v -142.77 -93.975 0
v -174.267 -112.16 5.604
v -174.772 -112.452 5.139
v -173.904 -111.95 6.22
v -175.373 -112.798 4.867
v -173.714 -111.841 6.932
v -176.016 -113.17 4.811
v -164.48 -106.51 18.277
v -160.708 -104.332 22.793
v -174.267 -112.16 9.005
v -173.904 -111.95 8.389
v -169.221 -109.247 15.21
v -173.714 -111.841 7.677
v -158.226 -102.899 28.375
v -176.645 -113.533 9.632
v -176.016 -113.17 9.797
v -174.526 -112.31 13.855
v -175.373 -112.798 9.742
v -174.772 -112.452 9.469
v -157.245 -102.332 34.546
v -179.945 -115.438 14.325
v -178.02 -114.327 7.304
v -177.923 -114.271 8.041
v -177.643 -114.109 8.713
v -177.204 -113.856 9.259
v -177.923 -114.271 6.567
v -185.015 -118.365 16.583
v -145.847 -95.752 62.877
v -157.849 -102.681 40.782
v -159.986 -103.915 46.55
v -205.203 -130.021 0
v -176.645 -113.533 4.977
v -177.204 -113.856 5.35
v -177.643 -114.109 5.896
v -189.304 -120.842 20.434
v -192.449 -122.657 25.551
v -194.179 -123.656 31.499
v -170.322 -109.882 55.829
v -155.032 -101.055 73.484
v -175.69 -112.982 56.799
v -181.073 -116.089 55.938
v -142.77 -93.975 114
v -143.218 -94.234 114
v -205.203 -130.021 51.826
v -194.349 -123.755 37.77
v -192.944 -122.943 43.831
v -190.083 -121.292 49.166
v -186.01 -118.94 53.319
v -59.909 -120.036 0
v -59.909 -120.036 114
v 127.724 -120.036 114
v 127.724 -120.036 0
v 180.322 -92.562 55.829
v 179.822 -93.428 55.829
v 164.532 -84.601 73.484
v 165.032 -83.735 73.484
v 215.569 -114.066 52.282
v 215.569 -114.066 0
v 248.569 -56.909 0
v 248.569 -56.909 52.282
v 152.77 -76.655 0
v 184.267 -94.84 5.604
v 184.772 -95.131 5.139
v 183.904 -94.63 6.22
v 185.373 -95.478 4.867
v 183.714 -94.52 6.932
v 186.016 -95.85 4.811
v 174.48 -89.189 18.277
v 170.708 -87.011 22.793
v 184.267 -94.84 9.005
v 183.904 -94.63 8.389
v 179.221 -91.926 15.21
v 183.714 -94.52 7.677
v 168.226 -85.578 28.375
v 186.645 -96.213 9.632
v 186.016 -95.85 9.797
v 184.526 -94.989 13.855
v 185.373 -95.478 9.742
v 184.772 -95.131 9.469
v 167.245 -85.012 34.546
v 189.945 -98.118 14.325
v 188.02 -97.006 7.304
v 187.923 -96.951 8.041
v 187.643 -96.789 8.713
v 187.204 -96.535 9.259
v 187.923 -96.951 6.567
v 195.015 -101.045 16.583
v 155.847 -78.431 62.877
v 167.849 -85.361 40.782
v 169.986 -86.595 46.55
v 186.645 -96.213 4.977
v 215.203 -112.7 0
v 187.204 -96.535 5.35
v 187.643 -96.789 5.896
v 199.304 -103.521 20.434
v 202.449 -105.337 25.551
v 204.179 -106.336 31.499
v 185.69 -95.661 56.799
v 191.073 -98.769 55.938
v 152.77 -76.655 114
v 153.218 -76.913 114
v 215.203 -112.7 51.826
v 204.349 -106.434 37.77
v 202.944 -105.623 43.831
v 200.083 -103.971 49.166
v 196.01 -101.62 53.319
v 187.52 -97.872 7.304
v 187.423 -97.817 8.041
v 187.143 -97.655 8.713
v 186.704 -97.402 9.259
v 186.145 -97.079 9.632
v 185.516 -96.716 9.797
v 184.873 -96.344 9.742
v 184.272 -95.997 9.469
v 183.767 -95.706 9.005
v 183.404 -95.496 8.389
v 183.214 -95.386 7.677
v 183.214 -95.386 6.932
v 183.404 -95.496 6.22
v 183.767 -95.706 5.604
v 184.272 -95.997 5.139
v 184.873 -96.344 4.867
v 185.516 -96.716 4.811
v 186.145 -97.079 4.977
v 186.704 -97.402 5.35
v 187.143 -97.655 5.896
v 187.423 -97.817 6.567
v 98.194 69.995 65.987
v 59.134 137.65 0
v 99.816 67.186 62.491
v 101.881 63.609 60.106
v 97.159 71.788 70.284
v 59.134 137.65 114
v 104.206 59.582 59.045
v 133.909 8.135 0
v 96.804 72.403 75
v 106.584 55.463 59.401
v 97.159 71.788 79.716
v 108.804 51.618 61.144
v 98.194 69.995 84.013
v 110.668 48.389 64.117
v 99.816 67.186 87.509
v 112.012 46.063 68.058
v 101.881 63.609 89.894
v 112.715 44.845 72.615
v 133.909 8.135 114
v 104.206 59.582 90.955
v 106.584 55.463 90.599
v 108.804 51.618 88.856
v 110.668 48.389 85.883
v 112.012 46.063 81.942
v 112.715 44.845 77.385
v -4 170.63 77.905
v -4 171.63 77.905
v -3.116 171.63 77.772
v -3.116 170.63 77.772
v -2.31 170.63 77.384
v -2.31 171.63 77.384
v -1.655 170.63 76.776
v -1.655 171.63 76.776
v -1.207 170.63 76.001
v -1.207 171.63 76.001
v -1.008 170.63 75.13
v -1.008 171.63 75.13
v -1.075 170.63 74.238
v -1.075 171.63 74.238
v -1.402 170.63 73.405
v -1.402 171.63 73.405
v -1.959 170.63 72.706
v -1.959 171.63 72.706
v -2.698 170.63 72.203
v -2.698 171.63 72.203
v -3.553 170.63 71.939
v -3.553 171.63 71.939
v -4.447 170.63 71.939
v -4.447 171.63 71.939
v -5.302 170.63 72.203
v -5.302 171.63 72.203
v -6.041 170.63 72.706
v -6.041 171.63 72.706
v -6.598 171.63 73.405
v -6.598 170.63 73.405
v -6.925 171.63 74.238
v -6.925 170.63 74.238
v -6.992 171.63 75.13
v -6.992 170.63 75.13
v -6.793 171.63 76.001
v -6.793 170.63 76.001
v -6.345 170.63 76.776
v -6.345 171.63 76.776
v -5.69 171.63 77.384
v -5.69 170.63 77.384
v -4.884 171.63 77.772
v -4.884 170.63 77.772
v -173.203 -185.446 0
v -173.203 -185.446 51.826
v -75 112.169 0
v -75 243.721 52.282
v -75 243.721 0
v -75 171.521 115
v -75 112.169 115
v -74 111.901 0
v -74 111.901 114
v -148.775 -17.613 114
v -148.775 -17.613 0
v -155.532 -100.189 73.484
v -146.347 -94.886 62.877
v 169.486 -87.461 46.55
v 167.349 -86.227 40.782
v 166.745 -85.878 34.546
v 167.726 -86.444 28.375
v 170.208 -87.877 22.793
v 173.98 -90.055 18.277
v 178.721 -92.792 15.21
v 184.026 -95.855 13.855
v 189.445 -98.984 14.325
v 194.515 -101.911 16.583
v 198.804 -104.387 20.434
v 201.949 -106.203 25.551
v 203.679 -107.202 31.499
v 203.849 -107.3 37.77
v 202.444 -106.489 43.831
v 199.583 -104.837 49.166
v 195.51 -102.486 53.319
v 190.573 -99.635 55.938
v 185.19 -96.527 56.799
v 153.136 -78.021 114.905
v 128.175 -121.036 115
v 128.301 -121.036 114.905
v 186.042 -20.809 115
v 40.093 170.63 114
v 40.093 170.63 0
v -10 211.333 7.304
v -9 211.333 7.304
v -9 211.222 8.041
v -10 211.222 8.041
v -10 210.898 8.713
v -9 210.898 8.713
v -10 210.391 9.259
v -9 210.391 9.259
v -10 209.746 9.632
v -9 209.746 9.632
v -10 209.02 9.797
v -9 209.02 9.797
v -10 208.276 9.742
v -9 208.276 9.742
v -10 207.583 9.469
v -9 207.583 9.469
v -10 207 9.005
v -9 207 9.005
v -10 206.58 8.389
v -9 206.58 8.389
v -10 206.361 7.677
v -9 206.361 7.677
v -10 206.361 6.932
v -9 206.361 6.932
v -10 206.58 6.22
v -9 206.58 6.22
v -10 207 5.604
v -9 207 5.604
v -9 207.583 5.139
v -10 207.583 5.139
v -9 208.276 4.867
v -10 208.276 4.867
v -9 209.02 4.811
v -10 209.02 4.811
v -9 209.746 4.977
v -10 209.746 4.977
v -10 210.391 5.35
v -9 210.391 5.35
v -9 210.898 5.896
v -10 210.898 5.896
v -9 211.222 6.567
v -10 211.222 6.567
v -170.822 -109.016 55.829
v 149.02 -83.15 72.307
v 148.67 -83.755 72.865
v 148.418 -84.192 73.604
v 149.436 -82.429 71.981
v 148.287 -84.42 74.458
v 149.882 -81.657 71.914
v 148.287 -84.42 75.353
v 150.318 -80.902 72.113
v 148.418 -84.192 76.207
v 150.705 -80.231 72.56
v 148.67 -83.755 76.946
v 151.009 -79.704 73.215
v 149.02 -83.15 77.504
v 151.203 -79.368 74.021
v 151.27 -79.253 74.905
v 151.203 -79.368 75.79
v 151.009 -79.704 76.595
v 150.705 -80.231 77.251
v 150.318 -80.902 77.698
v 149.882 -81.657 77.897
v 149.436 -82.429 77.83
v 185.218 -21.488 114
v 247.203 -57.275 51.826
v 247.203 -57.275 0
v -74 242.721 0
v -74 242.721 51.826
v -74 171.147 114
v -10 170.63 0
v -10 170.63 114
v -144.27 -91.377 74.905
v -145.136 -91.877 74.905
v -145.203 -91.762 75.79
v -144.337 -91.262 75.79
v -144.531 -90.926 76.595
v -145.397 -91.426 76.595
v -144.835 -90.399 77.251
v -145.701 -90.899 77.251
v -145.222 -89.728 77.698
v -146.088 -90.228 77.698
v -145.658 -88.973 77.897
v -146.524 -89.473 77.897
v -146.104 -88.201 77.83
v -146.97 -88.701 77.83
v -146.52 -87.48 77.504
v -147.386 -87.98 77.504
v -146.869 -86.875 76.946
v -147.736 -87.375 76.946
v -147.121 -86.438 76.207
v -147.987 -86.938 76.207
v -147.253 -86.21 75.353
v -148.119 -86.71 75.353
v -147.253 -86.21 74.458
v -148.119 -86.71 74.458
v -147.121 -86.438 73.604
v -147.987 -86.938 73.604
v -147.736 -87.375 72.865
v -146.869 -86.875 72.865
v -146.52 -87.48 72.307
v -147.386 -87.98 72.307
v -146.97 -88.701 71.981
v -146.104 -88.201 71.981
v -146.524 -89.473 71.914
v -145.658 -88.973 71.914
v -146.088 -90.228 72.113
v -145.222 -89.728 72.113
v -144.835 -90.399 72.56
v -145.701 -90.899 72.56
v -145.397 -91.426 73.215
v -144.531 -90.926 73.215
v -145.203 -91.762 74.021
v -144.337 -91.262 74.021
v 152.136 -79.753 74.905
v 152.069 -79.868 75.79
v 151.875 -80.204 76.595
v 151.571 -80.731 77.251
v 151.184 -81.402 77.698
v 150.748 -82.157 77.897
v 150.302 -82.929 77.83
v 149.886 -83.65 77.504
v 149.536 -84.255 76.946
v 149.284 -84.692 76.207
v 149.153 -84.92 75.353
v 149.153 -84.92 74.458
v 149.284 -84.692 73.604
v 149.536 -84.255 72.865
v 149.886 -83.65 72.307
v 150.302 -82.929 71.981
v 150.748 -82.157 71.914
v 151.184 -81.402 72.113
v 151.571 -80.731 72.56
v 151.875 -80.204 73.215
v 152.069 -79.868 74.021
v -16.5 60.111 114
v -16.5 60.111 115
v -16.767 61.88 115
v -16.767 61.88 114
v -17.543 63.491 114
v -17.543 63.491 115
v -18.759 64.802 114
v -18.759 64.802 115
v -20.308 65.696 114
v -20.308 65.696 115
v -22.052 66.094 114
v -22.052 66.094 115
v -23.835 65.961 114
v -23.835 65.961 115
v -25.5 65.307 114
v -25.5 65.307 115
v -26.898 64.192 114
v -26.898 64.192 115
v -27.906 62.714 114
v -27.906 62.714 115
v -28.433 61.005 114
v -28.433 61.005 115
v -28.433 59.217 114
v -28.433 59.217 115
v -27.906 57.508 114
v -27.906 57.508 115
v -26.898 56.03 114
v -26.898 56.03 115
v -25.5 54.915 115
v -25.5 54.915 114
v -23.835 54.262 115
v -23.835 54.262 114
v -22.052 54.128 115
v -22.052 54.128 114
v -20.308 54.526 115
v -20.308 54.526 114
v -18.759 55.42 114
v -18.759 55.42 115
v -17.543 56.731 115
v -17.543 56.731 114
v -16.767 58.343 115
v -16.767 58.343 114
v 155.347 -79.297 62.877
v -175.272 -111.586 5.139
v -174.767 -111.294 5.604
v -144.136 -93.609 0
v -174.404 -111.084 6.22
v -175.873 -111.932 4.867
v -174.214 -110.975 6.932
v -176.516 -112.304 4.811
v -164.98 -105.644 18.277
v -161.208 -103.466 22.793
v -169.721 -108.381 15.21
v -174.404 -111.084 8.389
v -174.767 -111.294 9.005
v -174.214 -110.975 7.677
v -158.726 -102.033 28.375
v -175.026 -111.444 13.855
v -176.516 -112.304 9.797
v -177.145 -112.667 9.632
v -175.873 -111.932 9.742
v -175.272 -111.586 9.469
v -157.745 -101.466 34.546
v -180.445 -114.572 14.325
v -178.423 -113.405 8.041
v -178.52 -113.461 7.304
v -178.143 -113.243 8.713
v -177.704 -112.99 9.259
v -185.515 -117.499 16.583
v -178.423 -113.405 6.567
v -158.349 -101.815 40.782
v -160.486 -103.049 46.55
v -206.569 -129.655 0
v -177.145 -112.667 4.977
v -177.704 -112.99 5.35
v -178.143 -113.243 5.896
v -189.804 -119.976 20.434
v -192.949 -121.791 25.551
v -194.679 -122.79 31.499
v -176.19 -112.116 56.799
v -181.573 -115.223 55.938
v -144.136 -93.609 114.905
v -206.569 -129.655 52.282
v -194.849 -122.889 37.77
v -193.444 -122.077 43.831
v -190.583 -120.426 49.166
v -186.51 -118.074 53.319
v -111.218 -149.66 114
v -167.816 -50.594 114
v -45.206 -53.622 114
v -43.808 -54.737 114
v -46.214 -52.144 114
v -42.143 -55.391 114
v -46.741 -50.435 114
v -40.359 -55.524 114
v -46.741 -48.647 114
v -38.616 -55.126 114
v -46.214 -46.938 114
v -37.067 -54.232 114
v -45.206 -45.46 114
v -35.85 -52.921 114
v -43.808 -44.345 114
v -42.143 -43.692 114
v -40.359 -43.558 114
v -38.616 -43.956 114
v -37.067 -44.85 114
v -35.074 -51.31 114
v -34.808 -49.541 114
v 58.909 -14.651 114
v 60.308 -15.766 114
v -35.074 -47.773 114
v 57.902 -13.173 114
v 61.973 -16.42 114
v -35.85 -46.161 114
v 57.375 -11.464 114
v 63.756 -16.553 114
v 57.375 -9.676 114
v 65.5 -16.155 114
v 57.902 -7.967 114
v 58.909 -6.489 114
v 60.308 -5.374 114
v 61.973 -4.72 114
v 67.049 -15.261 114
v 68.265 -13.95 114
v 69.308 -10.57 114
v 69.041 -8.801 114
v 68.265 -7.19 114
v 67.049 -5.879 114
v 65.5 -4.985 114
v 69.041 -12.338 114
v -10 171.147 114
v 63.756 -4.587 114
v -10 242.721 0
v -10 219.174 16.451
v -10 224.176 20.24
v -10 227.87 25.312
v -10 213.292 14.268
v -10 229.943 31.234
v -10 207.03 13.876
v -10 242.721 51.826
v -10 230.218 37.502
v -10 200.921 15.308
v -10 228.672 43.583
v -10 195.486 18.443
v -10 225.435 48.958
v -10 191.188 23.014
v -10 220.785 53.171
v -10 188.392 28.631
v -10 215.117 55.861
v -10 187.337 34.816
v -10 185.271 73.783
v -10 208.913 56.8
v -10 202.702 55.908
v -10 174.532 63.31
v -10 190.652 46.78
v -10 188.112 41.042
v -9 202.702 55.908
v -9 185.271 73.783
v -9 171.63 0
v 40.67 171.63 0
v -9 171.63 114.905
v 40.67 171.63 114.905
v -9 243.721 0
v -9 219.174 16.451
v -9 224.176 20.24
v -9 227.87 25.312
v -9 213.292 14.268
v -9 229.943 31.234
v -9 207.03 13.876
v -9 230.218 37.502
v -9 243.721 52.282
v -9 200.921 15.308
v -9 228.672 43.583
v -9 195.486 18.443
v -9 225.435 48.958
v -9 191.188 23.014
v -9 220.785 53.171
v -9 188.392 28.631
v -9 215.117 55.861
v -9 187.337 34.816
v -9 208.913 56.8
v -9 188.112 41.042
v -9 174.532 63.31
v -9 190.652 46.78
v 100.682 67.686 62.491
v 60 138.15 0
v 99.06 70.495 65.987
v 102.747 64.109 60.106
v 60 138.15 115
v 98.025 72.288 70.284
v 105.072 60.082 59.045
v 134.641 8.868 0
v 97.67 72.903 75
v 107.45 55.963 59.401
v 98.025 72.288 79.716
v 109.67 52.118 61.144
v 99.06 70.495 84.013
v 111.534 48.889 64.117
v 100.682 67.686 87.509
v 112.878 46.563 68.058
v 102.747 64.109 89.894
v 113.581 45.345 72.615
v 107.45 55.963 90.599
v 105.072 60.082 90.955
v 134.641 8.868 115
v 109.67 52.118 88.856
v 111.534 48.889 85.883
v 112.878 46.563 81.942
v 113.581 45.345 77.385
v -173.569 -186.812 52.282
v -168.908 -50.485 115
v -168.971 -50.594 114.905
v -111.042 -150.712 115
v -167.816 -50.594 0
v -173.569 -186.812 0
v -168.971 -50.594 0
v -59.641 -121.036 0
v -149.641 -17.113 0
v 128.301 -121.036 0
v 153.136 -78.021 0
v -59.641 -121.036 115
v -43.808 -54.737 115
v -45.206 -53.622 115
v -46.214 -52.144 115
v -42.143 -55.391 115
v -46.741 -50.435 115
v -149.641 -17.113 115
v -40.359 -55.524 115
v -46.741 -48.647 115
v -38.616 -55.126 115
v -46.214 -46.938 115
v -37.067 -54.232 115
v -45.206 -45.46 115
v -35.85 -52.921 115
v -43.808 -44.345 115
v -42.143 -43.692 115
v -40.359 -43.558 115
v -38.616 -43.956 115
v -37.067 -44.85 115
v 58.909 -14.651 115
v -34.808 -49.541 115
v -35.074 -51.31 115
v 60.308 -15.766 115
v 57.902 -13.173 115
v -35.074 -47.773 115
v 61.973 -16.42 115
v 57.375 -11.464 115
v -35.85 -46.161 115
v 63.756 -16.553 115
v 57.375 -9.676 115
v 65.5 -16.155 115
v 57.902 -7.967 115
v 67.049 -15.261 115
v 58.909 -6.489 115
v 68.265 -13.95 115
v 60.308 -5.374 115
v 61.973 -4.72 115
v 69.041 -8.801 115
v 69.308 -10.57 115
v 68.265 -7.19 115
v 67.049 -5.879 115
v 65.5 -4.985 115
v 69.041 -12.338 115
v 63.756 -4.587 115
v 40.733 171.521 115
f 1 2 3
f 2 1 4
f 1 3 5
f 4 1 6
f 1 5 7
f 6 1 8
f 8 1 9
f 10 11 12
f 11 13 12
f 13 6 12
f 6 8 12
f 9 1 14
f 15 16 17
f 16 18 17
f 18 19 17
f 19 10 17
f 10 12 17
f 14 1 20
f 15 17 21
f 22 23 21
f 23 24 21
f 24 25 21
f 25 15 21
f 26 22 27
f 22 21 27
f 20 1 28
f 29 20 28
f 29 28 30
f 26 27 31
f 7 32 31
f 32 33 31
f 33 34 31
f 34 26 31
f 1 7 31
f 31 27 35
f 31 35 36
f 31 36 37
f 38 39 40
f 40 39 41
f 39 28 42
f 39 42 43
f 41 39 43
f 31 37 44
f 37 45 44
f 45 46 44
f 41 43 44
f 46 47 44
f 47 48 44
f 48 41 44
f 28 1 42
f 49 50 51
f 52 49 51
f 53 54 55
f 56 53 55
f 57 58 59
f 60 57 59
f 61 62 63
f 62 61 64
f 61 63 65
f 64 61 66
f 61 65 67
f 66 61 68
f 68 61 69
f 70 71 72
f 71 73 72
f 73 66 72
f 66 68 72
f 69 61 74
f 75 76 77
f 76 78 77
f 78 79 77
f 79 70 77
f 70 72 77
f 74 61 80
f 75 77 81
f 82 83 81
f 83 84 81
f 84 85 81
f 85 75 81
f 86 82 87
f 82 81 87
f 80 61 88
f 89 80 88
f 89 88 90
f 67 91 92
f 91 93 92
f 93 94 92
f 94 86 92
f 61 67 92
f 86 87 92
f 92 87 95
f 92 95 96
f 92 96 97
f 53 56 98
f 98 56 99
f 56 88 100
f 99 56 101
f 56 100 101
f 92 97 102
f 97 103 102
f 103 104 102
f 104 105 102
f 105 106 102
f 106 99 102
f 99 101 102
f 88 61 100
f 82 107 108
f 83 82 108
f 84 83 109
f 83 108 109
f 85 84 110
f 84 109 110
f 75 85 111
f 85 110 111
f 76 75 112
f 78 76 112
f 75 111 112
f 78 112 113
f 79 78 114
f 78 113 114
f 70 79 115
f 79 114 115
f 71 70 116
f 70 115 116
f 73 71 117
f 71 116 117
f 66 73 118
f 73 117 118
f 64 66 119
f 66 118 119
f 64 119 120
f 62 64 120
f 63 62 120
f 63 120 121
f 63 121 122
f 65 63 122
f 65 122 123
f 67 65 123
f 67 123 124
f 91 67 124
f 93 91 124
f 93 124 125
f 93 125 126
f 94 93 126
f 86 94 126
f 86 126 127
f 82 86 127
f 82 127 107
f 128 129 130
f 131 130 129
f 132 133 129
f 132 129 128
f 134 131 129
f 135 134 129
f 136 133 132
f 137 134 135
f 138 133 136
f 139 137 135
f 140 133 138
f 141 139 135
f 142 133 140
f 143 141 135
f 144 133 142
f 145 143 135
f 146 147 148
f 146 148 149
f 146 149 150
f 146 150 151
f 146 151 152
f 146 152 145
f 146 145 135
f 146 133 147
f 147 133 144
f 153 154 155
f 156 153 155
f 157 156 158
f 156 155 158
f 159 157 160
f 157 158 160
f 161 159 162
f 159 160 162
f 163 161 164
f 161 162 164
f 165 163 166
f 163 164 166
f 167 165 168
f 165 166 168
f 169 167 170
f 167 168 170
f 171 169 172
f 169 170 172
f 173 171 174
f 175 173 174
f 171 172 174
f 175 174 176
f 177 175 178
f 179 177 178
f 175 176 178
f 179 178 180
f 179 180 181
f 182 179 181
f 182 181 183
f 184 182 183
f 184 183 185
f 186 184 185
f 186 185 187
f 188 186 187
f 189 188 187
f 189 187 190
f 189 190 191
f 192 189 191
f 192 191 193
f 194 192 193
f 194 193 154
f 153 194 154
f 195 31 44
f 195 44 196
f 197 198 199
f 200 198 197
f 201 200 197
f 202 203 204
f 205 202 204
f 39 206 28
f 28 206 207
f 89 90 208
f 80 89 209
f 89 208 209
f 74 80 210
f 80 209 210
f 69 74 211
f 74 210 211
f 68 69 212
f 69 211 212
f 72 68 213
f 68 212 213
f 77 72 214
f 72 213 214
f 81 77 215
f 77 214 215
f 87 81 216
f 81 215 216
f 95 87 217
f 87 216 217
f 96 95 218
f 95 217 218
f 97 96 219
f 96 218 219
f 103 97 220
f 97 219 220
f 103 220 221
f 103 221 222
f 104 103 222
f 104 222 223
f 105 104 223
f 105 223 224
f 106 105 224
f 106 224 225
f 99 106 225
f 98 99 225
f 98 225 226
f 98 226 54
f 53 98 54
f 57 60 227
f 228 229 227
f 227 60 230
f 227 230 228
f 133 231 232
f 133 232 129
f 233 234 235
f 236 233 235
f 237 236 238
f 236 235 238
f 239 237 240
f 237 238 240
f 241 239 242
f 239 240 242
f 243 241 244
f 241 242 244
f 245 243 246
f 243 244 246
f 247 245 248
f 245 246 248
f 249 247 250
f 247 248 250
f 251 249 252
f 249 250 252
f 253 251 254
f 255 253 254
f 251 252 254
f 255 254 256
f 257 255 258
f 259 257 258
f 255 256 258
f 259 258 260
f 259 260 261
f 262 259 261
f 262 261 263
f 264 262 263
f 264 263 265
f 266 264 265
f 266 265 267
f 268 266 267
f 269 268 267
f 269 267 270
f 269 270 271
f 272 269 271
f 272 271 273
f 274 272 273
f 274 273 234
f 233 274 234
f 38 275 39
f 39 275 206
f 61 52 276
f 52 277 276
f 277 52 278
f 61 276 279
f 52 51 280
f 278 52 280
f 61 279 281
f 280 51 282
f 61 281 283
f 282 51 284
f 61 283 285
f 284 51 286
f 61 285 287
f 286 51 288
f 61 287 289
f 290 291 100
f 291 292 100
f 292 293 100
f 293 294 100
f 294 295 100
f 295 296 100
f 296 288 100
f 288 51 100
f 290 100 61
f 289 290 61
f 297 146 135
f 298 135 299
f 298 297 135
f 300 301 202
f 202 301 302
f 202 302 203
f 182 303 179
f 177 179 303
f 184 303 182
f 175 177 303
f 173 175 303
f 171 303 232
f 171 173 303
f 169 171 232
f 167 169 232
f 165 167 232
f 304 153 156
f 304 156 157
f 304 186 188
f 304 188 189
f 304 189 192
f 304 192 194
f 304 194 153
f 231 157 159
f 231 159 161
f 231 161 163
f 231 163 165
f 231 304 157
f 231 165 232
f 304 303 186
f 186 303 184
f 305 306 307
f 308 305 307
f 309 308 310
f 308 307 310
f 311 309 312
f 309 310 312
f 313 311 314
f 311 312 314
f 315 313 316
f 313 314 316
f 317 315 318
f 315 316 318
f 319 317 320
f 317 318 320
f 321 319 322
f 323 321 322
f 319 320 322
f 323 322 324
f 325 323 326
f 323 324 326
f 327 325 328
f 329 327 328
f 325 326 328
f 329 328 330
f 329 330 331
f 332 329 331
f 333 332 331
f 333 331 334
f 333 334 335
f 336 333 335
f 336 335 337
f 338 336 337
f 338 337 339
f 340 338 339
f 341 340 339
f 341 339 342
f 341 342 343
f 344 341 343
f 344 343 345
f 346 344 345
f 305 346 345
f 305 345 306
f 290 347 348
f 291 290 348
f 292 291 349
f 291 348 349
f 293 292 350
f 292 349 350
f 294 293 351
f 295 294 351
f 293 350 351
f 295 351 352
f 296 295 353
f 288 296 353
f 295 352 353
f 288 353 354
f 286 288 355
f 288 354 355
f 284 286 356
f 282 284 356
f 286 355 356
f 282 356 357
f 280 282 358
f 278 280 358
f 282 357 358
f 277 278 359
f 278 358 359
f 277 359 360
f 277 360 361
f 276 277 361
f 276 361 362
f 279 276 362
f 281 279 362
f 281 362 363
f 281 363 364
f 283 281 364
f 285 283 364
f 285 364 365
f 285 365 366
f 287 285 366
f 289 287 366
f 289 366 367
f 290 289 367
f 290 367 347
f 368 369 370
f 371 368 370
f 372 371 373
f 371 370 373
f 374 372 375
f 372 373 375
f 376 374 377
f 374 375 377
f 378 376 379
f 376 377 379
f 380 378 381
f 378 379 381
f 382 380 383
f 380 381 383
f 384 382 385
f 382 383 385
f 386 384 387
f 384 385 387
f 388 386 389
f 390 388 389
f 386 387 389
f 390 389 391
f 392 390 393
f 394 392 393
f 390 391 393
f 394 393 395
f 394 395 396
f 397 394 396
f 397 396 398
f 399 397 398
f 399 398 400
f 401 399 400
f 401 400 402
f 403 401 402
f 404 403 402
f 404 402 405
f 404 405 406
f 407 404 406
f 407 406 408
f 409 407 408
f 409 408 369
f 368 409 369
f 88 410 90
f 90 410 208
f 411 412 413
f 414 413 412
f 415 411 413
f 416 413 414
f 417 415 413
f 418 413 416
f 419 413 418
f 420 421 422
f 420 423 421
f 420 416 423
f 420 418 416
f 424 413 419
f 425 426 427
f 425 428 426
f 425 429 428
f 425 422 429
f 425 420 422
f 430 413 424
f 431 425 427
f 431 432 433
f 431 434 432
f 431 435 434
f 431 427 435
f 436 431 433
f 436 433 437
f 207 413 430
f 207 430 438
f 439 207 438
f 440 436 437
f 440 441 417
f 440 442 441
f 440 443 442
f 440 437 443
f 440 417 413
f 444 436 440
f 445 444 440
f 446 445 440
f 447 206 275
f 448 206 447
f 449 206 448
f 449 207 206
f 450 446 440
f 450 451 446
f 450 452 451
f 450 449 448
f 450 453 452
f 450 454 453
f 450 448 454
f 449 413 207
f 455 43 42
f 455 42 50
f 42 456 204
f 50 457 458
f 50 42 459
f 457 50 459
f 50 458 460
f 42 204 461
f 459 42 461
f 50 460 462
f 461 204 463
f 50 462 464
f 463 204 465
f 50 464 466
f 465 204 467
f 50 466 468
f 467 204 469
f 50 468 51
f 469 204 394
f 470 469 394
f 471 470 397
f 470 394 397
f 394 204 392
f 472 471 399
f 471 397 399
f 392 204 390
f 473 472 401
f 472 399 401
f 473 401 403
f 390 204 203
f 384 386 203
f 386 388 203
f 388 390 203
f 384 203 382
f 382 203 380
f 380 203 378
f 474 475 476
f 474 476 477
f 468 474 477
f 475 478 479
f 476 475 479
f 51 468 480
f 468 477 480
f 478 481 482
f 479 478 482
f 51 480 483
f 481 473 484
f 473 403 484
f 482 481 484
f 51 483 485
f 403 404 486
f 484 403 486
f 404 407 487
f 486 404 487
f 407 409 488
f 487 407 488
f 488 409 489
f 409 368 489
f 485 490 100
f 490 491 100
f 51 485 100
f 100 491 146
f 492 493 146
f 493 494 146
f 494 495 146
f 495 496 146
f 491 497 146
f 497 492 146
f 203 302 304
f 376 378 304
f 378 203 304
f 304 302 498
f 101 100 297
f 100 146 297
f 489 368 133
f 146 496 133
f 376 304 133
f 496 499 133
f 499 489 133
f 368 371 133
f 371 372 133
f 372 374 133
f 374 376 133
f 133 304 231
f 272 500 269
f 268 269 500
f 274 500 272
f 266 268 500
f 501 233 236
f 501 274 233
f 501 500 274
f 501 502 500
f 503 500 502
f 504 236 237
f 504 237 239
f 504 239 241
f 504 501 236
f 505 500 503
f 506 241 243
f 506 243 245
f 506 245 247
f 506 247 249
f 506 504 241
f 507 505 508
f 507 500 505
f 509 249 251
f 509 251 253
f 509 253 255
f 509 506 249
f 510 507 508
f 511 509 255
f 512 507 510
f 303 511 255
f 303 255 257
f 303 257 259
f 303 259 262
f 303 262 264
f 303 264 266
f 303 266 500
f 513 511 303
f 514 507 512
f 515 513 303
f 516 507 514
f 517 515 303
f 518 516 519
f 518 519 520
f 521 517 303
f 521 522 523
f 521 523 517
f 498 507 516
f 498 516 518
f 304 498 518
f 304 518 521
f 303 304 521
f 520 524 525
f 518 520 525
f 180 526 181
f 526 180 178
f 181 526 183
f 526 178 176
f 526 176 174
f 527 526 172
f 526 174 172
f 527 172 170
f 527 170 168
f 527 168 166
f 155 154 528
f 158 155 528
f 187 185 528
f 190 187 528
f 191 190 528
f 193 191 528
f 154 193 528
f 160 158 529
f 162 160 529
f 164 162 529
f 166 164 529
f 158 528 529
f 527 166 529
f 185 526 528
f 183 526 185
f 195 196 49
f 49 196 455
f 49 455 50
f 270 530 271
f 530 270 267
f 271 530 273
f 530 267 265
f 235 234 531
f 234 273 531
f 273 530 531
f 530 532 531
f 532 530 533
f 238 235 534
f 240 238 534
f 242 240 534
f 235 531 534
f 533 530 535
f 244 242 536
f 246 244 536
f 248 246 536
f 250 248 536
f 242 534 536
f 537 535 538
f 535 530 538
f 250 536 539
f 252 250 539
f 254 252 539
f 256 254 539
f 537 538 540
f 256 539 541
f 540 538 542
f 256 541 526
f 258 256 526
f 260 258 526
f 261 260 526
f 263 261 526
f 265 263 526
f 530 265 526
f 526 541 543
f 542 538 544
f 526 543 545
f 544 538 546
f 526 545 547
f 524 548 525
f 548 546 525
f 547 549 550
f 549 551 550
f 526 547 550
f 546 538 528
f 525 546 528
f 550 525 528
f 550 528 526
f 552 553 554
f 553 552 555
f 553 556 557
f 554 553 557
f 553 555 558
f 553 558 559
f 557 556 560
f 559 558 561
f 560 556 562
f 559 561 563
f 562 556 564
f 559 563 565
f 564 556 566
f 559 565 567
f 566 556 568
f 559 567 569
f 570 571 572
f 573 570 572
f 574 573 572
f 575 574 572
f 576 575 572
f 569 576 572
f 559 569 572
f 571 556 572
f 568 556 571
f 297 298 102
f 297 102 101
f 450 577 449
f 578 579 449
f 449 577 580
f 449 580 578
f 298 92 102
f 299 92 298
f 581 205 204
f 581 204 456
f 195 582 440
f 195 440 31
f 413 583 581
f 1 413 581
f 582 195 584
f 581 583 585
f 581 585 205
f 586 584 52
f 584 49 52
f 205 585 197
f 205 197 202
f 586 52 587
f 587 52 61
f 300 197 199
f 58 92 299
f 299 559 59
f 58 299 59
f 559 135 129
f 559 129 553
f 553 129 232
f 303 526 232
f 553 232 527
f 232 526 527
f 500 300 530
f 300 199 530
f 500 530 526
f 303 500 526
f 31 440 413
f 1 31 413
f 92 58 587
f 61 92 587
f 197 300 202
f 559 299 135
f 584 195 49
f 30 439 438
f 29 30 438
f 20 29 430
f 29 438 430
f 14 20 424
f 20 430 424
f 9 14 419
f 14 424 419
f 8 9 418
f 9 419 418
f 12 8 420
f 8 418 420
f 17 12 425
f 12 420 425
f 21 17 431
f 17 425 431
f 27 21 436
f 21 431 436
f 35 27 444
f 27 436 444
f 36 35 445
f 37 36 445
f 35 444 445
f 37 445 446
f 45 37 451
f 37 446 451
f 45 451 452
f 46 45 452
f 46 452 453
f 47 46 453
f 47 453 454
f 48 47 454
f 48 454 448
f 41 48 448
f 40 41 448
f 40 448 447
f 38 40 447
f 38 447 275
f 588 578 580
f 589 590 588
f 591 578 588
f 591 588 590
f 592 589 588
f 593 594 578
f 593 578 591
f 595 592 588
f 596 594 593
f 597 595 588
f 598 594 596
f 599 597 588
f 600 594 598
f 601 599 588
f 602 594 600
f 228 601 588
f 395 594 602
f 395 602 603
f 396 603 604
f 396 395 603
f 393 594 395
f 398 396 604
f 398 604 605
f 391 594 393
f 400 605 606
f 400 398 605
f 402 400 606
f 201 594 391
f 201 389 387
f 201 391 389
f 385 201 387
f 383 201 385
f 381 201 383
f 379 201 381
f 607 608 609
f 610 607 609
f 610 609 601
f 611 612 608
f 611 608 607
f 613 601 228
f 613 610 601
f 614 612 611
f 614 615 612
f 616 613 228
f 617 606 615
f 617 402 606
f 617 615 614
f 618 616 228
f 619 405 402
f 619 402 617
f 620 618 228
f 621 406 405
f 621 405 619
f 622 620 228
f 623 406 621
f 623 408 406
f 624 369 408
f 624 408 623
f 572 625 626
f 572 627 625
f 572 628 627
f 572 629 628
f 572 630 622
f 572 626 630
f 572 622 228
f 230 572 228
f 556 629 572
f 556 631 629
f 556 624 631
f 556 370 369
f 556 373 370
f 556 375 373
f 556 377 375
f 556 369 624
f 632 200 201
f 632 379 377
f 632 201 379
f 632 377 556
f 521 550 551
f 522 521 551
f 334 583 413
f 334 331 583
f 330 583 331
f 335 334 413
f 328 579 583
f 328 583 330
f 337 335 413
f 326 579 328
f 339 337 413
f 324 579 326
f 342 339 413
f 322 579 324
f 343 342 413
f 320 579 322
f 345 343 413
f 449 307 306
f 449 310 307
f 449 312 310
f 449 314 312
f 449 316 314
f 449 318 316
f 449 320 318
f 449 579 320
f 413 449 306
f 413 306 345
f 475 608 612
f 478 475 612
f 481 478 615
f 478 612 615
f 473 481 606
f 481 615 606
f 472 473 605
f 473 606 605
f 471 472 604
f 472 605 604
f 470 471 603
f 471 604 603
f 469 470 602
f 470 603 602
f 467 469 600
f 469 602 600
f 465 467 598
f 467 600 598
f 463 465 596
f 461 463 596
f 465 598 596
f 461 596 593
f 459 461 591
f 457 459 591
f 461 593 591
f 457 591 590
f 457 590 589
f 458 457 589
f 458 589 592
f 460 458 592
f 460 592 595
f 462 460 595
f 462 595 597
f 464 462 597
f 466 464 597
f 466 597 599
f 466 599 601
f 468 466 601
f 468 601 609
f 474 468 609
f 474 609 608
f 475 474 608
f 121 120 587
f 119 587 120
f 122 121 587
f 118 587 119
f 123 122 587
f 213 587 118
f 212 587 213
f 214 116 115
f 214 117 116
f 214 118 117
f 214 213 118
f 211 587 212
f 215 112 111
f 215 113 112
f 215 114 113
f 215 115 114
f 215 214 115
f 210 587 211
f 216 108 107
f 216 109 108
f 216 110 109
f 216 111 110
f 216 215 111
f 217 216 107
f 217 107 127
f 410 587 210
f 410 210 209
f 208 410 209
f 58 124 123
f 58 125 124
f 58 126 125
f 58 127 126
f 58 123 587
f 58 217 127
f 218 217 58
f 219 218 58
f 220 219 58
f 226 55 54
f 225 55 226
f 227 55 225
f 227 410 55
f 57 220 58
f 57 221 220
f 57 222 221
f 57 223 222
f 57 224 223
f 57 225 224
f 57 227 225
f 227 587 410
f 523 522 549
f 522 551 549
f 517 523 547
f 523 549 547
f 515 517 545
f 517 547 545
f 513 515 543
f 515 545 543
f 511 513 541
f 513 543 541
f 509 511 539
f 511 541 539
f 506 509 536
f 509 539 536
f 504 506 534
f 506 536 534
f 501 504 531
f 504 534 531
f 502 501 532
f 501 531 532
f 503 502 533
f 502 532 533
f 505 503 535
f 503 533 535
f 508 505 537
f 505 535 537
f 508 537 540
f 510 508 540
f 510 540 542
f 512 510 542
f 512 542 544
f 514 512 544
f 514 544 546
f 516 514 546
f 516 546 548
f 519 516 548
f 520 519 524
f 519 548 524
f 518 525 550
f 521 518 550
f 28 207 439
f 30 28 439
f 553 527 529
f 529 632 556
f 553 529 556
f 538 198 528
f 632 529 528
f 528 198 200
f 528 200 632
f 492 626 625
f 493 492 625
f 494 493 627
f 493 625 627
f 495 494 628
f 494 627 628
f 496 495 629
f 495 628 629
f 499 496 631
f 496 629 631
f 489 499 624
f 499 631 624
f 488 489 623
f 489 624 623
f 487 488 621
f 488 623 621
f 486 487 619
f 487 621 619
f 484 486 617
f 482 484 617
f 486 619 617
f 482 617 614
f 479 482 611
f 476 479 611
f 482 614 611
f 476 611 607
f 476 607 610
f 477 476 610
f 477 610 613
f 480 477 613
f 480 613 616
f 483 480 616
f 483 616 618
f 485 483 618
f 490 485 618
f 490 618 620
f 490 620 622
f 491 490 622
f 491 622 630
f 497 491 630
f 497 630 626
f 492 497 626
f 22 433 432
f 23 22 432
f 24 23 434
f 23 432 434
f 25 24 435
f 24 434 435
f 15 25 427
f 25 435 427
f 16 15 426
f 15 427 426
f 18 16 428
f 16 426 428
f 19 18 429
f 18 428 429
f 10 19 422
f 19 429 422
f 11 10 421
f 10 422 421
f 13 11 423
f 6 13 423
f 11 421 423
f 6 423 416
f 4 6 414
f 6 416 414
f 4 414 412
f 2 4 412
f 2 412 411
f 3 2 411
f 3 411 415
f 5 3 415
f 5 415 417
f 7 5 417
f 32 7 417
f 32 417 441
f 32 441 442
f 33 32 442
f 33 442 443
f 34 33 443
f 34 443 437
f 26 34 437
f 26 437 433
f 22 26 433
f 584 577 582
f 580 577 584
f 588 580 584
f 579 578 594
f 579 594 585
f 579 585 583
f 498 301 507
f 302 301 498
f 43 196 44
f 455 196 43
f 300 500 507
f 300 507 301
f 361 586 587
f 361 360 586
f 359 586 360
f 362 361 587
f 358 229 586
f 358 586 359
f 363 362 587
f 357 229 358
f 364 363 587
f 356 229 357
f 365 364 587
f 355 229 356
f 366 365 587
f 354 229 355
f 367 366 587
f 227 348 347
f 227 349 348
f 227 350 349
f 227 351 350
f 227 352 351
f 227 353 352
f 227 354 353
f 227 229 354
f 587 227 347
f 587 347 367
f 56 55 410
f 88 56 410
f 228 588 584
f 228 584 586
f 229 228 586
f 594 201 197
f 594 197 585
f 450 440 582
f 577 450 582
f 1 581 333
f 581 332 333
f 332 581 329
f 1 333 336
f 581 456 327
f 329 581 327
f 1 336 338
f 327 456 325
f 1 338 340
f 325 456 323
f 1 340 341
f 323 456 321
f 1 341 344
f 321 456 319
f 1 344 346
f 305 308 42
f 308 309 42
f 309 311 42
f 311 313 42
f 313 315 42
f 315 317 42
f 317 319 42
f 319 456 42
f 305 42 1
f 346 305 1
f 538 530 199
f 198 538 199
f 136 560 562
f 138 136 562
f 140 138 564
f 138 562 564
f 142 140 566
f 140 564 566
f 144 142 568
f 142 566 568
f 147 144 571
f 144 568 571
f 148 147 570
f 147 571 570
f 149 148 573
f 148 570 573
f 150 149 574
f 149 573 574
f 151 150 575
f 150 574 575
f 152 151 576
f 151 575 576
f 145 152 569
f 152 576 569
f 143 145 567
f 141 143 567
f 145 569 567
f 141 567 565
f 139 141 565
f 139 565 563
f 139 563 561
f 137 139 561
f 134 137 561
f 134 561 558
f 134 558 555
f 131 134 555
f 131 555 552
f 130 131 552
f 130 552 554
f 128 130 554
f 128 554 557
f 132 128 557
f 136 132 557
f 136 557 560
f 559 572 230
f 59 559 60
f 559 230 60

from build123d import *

# Parameters (mm, degrees)
SKETCH_1_R           = 255
EXTRUDE_1_DEPTH      = 115
CUT_EXTRUDE_1_DEPTH  = 379.516842426
CUT_EXTRUDE_START    = -140
CUT_EXTRUDE_2_DEPTH  = 140
CUT_EXTRUDE_3_DEPTH  = 140
CUT_EXTRUDE_4_DEPTH  = 140
CUT_EXTRUDE_5_DEPTH  = 140
SHELL_1_T            = -1
SKETCH_7_R           = 21.5
CUT_EXTRUDE_6_DEPTH  = 10
CUT_EXTRUDE_7_DEPTH  = 10
CUT_EXTRUDE_8_DEPTH  = 10
SKETCH_10_R          = 6
CUT_EXTRUDE_9_DEPTH  = 10
SKETCH_11_R          = 2.5
CUT_EXTRUDE_10_DEPTH = 10
SKETCH_13_R          = 2.5
CUT_EXTRUDE_11_DEPTH = 10
SKETCH_12_R          = 2.5
CUT_EXTRUDE_12_DEPTH = 10
SKETCH_16_R          = 16
CUT_EXTRUDE_13_DEPTH = 4.5
CUT_EXTRUDE_14_DEPTH = 4.5
SKETCH_18_R          = 3
CUT_EXTRUDE_15_DEPTH = 4.5
SKETCH_19_R          = 3
CUT_EXTRUDE_16_DEPTH = 4.5
SKETCH_20_R          = 3
CUT_EXTRUDE_17_DEPTH = 4.5


with BuildPart() as part:
    # 草图1 → 拉伸1 (new body)
    with BuildSketch(Plane.XY):
        Circle(SKETCH_1_R)
    extrude(amount=EXTRUDE_1_DEPTH)

    # 草图2 → 切除-拉伸1 (cut, through all)
    with BuildSketch(Plane.XY.offset(115)):
        with BuildLine():
            Line((-75, 243.721152139), (-75, 112.168783649))
            Line((-75, 112.168783649), (-149.641016151, -17.113248654))
            Line((-149.641016151, -17.113248654), (-168.970965418, -50.593702892))
            Line((-168.970965418, -50.593702892), (-144.135940052, -93.609228634))
            Line((-144.135940052, -93.609228634), (-216.198889893, -135.214792124))
            ThreePointArc((-216.198889893, -135.214792124), (-238.950435932, 89.037571663), (-75, 243.721152139))
        make_face()
        with BuildLine():
            Line((134.641016151, 8.867513459), (248.568709192, -56.908670786))
            ThreePointArc((248.568709192, -56.908670786), (196.584016918, 162.418361931), (-9, 254.841126979))
            Line((-9, 254.841126979), (-9, 171.63))
            Line((-9, 171.63), (40.670050733, 171.63))
            Line((40.670050733, 171.63), (60, 138.149545762))
            Line((60, 138.149545762), (134.641016151, 8.867513459))
        make_face()
        with BuildLine():
            Line((-173.568709192, -186.812481353), (-59.641016151, -121.036297108))
            Line((-59.641016151, -121.036297108), (89.641016151, -121.036297108))
            Line((89.641016151, -121.036297108), (128.300914685, -121.036297108))
            Line((128.300914685, -121.036297108), (153.135940052, -78.020771366))
            Line((153.135940052, -78.020771366), (225.198889893, -119.626334856))
            ThreePointArc((225.198889893, -119.626334856), (42.366419014, -251.455933595), (-173.568709192, -186.812481353))
        make_face()
    extrude(amount=-CUT_EXTRUDE_1_DEPTH, mode=Mode.SUBTRACT)

    # 草图3 → 切除-拉伸2 (cut)
    with BuildSketch(Plane.XY.offset(115).offset(CUT_EXTRUDE_START)):
        with BuildLine():
            Line((225.198889893, -119.626334856), (215.568709192, -114.066347435))
            Line((215.568709192, -114.066347435), (248.568709192, -56.908670786))
            ThreePointArc((248.568709192, -56.908670786), (238.950435932, -89.037571663), (225.198889893, -119.626334856))
        make_face()
        with BuildLine():
            Line((-9, 254.841126979), (-9, 243.721152139))
            Line((-9, 243.721152139), (-75, 243.721152139))
            ThreePointArc((-75, 243.721152139), (-42.366419014, 251.455933595), (-9, 254.841126979))
        make_face()
        with BuildLine():
            Line((-216.198889893, -135.214792124), (-206.568709192, -129.654804704))
            Line((-206.568709192, -129.654804704), (-173.568709192, -186.812481353))
            ThreePointArc((-173.568709192, -186.812481353), (-196.584016918, -162.418361931), (-216.198889893, -135.214792124))
        make_face()
    extrude(amount=CUT_EXTRUDE_2_DEPTH, mode=Mode.SUBTRACT)

    # 草图4 → 切除-拉伸3 (cut)
    with BuildSketch(Plane(origin=(37.5, -64.951905284, 0), x_dir=(0.8660254037844386, 0.5000000000000002, 0), z_dir=(0.5000000000000002, -0.8660254037844386, 0))):
        Polygon((-171.521152139, 115), (-243.721152139, 115), (-243.721152139, 52.281731212), align=None)
    extrude(amount=-CUT_EXTRUDE_3_DEPTH, mode=Mode.SUBTRACT)

    # 草图5 → 切除-拉伸4 (cut)
    with BuildSketch(Plane(origin=(37.5, 64.951905284, 0), x_dir=(-0.8660254037844387, 0.4999999999999999, 0), z_dir=(0.4999999999999999, 0.8660254037844387, 0))):
        Polygon((-171.521152139, 115), (-243.721152139, 115), (-243.721152139, 52.281731212), align=None)
    extrude(amount=-CUT_EXTRUDE_4_DEPTH, mode=Mode.SUBTRACT)

    # 草图6 → 切除-拉伸5 (cut)
    with BuildSketch(Plane.ZY.offset(75)):
        Polygon((115, 171.521152139), (115, 243.721152139), (52.281731212, 243.721152139), align=None)
    extrude(amount=-CUT_EXTRUDE_5_DEPTH, mode=Mode.SUBTRACT)

    # 抽壳1
    shell_1_openings = [part.faces().sort_by_distance(p)[0] for p in [
        (0, 0, 0),
    ]]
    offset(amount=SHELL_1_T, openings=shell_1_openings, kind=Kind.INTERSECTION)

    # 草图7 → 切除-拉伸6 (cut)
    with BuildSketch(Plane(origin=(-9, 0, 0), x_dir=(0, 0, -1), z_dir=(1, 0, 0))):
        with Locations(Location((-35.3, 208.831152139, 0), (0, 0, 90))):
            Circle(SKETCH_7_R)
    extrude(amount=-CUT_EXTRUDE_6_DEPTH, mode=Mode.SUBTRACT)

    # 草图8 → 切除-拉伸7 (cut)
    with BuildSketch(Plane(origin=(4.5, 7.794228634, 0), x_dir=(0.8660254037844387, -0.5, 0), z_dir=(-0.5, -0.8660254037844387, 0))):
        with BuildLine():
            Line((202.443951117, 55.829336646), (184.789521579, 73.483766184))
            Line((184.789521579, 73.483766184), (174.182919861, 62.877164466))
            Line((174.182919861, 62.877164466), (190.509645151, 46.550439177))
            ThreePointArc((190.509645151, 46.550439177), (222.027914903, 18.326625187), (202.443951117, 55.829336646))
        make_face()
    extrude(amount=-CUT_EXTRUDE_7_DEPTH, mode=Mode.SUBTRACT)

    # 草图9 → 切除-拉伸8 (cut)
    with BuildSketch(Plane(origin=(4.5, -7.794228634, 0), x_dir=(-0.8660254037844388, -0.4999999999999996, 0), z_dir=(-0.4999999999999996, 0.8660254037844388, 0))):
        with BuildLine():
            Line((202.443951117, 55.829336646), (184.789521579, 73.483766184))
            Line((184.789521579, 73.483766184), (174.182919861, 62.877164466))
            Line((174.182919861, 62.877164466), (190.509645151, 46.550439177))
            ThreePointArc((190.509645151, 46.550439177), (222.027914903, 18.326625187), (202.443951117, 55.829336646))
        make_face()
    extrude(amount=-CUT_EXTRUDE_8_DEPTH, mode=Mode.SUBTRACT)

    # 草图10 → 切除-拉伸9 (cut)
    with BuildSketch(Plane.XY.offset(115)):
        with Locations((-22.5, 60.111069989)):
            Circle(SKETCH_10_R)
        with Locations((-40.807713659, -49.54110658)):
            Circle(SKETCH_10_R)
        with Locations((63.307713659, -10.56996341)):
            Circle(SKETCH_10_R)
    extrude(amount=-CUT_EXTRUDE_9_DEPTH, mode=Mode.SUBTRACT)

    # 草图11 → 切除-拉伸10 (cut)
    with BuildSketch(Plane(origin=(-9, 0, 0), x_dir=(0, 0, -1), z_dir=(1, 0, 0))):
        with Locations(Location((-7.30433866, 208.832756681, 0), (0, 0, 90))):
            Circle(SKETCH_11_R)
    extrude(amount=-CUT_EXTRUDE_10_DEPTH, mode=Mode.SUBTRACT)

    # 草图13 → 切除-拉伸11 (cut)
    with BuildSketch(Plane(origin=(4.5, -7.794228634, 0), x_dir=(-0.8660254037844389, -0.4999999999999995, 0), z_dir=(-0.4999999999999995, 0.8660254037844389, 0))):
        with Locations((208.832756681, 7.30433866)):
            Circle(SKETCH_13_R)
    extrude(amount=-CUT_EXTRUDE_11_DEPTH, mode=Mode.SUBTRACT)

    # 草图12 → 切除-拉伸12 (cut)
    with BuildSketch(Plane(origin=(4.5, 7.794228634, 0), x_dir=(0.8660254037844386, -0.4999999999999999, 0), z_dir=(-0.49999999999999994, -0.8660254037844387, 0))):
        with Locations((208.832756681, 7.30433866)):
            Circle(SKETCH_12_R)
    extrude(amount=-CUT_EXTRUDE_12_DEPTH, mode=Mode.SUBTRACT)

    # 草图16 → 切除-拉伸13 (cut)
    with BuildSketch(Plane(origin=(104.820508076, 60.518148554, 0), x_dir=(0, 0, -1), z_dir=(0.8660254037844385, 0.5000000000000004, 0))):
        with Locations(Location((-75, -1.699085315, 0), (0, 0, 90))):
            Circle(SKETCH_16_R)
    extrude(amount=-CUT_EXTRUDE_13_DEPTH, mode=Mode.SUBTRACT)

    # 草图17 → 切除-拉伸14 (cut)
    with BuildSketch(Plane(origin=(-9, 0, 0), x_dir=(0, 0, -1), z_dir=(1, 0, 0))):
        with BuildLine():
            Line((-55.907885828, 202.70211945), (-73.782506819, 185.270662567))
            Line((-73.782506819, 185.270662567), (-63.309864805, 174.531772063))
            Line((-63.309864805, 174.531772063), (-46.779507597, 190.652293392))
            ThreePointArc((-46.779507597, 190.652293392), (-18.162328595, 221.813841337), (-55.907885828, 202.70211945))
        make_face()
    extrude(amount=-CUT_EXTRUDE_14_DEPTH, mode=Mode.SUBTRACT)

    # 草图18 → 切除-拉伸15 (cut)
    with BuildSketch(Plane(origin=(0, 171.63, 0), x_dir=(-1, 0, 0), z_dir=(0, 1, 0))):
        with Locations(Location((4, 74.905446684, 0), (0, 0, 90))):
            Circle(SKETCH_18_R)
    extrude(amount=-CUT_EXTRUDE_15_DEPTH, mode=Mode.SUBTRACT)

    # 草图19 → 切除-拉伸16 (cut)
    with BuildSketch(Plane(origin=(148.635940052, -85.815, 0), x_dir=(0, 0, -1), z_dir=(0.8660254037844388, -0.49999999999999983, 0))):
        with Locations(Location((-74.905446684, 4, 0), (0, 0, 90))):
            Circle(SKETCH_19_R)
    extrude(amount=-CUT_EXTRUDE_16_DEPTH, mode=Mode.SUBTRACT)

    # 草图20 → 切除-拉伸17 (cut)
    with BuildSketch(Plane(origin=(-148.635940052, -85.815, 0), x_dir=(0, 0, 1), z_dir=(-0.866025403784438, -0.5000000000000009, 0))):
        with Locations(Location((74.905446684, -4, 0), (0, 0, 270))):
            Circle(SKETCH_20_R)
    extrude(amount=-CUT_EXTRUDE_17_DEPTH, mode=Mode.SUBTRACT)


solid = part.part
